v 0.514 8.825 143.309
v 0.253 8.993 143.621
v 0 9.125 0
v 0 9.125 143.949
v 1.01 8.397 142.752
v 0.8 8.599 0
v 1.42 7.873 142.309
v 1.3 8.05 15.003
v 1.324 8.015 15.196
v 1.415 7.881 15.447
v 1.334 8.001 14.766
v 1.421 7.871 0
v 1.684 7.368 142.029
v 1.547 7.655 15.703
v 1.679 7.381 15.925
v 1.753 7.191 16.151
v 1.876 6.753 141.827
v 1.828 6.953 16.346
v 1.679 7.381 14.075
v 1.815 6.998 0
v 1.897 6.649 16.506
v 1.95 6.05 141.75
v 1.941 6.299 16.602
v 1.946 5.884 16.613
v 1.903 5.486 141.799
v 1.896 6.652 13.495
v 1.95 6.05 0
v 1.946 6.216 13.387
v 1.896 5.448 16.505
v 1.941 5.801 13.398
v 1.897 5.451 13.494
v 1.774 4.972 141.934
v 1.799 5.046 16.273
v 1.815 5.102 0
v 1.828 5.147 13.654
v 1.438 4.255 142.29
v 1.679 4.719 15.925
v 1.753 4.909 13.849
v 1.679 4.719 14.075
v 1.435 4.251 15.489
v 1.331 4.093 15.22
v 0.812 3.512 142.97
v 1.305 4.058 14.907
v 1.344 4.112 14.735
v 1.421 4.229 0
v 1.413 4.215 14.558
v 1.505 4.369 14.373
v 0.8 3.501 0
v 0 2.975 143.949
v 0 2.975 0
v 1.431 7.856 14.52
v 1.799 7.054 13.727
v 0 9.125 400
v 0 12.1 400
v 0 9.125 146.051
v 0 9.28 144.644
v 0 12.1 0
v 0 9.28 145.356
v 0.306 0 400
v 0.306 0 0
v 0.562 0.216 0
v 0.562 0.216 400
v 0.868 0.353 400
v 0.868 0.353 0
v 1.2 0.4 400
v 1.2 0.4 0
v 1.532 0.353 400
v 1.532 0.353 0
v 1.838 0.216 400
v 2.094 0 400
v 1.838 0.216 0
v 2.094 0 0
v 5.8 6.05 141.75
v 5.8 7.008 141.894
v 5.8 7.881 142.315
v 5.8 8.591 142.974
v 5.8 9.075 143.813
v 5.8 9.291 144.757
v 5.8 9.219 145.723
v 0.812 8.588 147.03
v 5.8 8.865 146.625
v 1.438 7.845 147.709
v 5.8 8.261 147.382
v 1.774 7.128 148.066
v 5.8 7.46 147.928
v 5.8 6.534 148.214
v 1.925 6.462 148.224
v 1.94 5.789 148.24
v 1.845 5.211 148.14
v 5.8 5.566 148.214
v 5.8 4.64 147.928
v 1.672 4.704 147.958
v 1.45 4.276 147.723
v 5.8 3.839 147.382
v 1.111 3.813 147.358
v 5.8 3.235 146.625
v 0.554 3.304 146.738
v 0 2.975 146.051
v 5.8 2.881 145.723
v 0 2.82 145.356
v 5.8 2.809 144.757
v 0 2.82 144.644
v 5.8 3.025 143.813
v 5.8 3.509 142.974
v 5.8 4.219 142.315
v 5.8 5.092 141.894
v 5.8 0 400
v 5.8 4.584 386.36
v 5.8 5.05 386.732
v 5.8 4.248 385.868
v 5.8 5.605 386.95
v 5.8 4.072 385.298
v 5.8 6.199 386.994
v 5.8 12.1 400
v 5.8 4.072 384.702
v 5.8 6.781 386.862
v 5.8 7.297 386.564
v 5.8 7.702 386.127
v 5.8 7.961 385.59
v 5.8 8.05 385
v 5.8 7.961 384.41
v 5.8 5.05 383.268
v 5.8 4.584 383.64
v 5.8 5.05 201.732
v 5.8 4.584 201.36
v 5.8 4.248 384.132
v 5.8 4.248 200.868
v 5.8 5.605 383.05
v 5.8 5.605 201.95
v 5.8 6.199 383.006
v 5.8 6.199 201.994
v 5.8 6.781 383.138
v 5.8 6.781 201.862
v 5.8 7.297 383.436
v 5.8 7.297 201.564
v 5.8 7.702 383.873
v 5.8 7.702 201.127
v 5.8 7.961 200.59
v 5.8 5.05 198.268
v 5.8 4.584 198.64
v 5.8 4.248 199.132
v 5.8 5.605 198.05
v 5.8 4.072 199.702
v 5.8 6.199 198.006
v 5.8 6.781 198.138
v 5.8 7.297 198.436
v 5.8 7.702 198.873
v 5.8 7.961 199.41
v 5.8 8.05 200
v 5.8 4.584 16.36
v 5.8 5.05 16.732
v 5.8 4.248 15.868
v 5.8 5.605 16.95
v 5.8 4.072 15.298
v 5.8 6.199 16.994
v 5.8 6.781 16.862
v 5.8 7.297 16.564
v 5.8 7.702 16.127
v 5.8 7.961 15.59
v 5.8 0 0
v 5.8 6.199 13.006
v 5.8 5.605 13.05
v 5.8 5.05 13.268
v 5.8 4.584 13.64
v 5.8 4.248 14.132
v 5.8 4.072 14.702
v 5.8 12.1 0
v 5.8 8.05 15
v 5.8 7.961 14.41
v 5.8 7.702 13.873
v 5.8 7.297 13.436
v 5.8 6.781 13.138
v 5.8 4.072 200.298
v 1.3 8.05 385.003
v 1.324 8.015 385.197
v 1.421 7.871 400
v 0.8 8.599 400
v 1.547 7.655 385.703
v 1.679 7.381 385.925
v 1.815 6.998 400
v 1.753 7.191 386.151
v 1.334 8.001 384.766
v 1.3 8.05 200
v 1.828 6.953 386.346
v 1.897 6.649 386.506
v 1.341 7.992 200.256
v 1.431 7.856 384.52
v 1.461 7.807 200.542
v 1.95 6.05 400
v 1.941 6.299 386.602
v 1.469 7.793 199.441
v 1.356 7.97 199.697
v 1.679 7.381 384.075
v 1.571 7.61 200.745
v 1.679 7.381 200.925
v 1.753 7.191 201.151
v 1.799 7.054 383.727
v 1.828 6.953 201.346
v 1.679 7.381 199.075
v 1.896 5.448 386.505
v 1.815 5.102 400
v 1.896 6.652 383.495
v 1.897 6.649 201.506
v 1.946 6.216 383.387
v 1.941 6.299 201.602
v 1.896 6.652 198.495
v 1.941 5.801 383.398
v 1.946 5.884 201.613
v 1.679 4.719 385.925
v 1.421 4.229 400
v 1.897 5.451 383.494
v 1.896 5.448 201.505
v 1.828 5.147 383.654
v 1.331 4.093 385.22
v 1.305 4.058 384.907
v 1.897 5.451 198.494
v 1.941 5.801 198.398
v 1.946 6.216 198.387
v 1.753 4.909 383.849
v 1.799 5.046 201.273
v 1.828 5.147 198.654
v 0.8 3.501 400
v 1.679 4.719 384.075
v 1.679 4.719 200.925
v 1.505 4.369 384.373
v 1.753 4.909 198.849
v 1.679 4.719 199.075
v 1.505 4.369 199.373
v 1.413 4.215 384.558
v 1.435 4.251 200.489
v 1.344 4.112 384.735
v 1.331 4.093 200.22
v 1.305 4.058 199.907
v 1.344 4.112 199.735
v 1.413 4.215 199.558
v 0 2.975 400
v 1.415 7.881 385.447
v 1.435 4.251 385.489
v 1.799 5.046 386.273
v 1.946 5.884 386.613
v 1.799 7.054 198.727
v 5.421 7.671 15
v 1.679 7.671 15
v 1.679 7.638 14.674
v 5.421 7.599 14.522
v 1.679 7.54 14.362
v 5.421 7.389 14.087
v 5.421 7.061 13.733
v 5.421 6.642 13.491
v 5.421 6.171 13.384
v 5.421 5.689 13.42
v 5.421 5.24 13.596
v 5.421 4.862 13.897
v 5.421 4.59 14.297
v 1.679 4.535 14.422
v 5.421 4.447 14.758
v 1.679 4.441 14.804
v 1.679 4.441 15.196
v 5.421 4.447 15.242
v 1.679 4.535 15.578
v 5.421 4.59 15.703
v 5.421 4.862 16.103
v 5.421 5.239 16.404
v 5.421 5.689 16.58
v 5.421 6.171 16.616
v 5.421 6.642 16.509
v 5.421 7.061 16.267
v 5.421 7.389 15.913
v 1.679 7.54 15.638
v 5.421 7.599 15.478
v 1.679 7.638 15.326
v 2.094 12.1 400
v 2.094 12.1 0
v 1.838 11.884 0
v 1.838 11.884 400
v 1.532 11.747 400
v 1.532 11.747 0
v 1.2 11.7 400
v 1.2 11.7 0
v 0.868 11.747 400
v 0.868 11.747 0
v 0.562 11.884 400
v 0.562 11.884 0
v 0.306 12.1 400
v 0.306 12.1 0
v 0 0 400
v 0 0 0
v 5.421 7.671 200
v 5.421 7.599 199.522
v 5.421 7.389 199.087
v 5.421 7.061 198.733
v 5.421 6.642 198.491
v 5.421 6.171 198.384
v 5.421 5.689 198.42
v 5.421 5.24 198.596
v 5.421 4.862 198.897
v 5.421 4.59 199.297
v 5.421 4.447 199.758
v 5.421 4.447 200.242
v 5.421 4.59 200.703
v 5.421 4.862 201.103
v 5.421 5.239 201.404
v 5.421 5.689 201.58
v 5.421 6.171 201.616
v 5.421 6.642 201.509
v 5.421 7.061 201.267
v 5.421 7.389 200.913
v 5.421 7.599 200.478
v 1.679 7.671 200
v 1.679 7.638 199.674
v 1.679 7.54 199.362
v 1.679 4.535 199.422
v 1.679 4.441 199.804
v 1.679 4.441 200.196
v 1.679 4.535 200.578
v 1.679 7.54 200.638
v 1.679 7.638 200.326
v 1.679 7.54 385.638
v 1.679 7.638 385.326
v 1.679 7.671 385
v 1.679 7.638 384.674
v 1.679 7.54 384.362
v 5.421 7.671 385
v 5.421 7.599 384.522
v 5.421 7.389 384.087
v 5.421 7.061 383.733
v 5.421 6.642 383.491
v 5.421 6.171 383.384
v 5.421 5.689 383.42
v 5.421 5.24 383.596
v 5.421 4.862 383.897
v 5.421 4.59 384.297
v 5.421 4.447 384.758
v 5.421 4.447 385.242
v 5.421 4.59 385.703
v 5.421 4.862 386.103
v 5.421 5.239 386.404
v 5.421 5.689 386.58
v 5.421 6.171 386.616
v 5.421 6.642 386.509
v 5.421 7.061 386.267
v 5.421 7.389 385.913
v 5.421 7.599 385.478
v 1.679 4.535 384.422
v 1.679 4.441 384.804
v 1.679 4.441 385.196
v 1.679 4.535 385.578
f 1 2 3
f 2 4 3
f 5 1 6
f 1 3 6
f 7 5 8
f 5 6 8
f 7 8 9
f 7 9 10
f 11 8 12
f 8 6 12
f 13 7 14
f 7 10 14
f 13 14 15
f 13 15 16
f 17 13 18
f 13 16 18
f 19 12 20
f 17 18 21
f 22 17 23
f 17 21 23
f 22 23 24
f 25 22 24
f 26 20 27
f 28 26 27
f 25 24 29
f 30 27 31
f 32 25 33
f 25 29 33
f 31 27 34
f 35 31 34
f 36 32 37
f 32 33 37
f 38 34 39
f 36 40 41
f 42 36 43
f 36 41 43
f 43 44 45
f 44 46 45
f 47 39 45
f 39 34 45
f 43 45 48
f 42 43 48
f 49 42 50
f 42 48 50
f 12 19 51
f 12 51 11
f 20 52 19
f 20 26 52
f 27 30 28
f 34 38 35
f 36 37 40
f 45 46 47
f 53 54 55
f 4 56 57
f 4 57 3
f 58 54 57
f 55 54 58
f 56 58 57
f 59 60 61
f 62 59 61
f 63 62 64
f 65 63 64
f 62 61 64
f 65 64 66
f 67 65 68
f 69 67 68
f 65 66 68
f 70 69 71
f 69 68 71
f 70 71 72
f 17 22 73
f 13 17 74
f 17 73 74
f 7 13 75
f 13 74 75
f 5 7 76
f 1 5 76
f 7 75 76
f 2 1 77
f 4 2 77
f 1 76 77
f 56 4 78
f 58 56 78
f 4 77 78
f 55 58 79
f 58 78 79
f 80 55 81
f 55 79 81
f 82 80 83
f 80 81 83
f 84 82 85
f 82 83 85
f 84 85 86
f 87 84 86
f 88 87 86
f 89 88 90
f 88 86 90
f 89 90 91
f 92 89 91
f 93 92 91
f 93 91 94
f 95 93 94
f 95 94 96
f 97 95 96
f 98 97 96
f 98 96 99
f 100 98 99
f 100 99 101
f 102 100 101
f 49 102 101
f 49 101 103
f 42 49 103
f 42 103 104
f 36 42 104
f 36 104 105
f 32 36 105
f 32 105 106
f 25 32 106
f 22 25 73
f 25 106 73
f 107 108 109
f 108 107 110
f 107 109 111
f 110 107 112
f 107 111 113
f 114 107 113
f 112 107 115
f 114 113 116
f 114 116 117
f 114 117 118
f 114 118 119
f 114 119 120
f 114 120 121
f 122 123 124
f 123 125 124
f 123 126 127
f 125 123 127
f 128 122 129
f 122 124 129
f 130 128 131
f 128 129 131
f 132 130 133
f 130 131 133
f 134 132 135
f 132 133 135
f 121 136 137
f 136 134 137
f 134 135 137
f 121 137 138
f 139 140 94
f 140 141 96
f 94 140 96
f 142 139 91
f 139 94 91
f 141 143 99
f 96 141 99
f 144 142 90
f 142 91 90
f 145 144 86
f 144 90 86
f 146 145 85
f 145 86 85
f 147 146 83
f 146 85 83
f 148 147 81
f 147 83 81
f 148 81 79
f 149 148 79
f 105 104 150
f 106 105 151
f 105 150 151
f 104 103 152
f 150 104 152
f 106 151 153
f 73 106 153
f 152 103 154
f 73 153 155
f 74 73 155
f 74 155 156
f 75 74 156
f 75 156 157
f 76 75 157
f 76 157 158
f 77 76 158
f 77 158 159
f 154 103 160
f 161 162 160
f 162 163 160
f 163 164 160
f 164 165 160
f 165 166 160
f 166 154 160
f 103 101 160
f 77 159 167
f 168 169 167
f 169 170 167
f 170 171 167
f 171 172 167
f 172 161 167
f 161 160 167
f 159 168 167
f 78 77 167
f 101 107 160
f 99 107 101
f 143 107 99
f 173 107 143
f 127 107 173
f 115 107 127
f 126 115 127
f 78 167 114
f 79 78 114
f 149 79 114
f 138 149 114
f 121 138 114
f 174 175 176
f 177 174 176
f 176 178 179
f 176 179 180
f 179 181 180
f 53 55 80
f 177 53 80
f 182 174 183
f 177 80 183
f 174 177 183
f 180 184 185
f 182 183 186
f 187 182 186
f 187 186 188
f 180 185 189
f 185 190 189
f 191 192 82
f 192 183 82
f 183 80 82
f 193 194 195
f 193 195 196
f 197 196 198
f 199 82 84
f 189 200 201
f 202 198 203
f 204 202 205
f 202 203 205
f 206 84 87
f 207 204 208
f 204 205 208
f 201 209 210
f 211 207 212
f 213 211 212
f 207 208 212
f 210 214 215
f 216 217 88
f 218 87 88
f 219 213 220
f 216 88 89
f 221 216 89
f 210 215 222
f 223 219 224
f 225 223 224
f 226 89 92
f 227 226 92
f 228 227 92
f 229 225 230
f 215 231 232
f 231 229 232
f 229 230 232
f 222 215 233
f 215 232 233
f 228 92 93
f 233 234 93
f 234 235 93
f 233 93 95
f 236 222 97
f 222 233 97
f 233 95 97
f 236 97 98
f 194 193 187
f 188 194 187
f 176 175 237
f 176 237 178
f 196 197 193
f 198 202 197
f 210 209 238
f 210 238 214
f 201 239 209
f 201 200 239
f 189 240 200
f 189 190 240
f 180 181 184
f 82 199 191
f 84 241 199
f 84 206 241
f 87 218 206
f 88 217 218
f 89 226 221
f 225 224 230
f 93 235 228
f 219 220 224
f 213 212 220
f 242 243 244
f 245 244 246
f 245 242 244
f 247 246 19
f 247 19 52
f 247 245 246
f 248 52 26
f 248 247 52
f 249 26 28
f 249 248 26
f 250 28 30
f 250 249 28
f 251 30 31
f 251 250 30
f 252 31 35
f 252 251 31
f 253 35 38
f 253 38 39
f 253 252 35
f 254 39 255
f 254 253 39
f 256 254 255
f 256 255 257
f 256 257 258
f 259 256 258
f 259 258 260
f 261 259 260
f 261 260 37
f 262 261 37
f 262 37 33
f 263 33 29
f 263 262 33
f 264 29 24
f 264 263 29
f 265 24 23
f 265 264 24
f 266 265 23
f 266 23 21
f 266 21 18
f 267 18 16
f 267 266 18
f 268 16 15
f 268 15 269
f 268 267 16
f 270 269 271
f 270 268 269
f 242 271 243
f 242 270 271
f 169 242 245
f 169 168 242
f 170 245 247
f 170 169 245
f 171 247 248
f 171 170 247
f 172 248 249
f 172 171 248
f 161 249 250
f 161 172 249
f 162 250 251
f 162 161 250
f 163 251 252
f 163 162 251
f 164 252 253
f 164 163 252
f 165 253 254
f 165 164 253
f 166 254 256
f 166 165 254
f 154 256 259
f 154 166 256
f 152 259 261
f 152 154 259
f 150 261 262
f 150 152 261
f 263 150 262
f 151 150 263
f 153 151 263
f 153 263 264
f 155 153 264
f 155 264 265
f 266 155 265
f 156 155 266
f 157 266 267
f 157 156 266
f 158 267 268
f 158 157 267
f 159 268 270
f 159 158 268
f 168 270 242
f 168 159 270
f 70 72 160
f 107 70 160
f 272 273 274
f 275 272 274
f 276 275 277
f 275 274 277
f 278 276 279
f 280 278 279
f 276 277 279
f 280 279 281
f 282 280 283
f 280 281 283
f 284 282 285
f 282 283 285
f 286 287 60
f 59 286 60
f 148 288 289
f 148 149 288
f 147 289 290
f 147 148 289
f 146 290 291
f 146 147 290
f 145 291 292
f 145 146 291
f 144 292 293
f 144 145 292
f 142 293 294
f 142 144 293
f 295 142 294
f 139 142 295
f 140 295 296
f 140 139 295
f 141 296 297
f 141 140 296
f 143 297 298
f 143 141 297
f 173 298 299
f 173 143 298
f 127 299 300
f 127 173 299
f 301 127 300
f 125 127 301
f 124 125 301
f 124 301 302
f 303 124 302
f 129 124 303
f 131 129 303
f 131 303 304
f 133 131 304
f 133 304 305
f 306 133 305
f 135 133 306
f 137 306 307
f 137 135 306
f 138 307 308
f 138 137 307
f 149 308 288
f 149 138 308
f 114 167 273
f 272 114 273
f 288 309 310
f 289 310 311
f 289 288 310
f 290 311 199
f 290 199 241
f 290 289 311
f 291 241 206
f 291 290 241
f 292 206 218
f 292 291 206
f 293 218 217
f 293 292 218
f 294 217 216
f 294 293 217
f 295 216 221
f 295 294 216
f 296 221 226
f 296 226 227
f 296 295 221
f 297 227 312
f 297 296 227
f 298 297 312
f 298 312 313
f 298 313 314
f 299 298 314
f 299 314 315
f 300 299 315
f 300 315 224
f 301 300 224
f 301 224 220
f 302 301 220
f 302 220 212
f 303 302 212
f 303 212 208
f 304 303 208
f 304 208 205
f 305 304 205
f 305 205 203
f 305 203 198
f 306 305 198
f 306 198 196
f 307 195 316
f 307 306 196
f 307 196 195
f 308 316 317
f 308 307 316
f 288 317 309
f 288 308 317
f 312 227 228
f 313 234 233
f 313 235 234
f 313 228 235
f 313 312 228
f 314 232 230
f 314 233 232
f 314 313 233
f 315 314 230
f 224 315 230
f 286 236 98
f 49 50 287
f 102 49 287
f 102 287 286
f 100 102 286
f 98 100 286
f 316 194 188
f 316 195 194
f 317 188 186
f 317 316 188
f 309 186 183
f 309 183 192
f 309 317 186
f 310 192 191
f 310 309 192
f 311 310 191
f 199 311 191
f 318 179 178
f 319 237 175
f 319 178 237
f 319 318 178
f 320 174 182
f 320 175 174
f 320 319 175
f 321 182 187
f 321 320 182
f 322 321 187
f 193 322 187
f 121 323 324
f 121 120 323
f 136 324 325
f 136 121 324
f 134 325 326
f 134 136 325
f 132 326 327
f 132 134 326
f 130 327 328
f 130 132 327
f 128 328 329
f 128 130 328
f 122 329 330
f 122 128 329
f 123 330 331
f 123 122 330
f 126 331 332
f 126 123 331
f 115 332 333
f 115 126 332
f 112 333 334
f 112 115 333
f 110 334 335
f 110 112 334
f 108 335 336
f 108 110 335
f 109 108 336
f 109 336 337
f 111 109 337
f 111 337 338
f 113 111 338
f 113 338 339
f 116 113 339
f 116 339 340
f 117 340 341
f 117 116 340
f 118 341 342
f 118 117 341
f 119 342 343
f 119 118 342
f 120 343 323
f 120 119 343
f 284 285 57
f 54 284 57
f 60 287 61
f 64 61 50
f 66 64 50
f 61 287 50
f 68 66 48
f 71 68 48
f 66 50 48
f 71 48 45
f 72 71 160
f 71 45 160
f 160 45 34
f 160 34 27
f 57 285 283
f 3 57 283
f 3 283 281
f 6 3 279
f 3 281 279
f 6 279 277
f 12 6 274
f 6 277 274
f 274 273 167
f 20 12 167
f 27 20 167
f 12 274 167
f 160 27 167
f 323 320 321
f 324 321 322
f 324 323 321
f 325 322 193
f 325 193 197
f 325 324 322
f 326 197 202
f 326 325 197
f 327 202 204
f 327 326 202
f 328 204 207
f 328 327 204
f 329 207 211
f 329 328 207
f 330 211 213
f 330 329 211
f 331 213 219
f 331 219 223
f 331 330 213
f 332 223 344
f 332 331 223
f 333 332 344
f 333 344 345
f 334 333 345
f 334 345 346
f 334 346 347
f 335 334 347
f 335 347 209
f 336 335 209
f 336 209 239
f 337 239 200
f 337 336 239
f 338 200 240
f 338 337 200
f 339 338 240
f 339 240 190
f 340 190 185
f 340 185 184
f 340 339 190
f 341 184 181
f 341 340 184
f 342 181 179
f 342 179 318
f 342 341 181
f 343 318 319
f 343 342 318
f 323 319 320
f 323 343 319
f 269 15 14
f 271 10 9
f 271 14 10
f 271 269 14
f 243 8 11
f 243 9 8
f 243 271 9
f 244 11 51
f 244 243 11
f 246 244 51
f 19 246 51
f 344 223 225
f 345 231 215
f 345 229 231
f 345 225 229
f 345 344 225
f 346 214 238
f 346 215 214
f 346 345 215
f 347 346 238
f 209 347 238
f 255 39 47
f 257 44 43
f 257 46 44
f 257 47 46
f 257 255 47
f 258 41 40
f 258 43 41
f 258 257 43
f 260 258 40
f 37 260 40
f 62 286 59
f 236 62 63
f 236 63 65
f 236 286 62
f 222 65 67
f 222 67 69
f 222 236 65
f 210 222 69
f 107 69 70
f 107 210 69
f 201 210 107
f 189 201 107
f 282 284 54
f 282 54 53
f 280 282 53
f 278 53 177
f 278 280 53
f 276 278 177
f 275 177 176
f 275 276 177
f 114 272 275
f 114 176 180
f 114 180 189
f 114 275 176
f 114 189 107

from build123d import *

# Parameters (mm, degrees)
BOSS_EXTRUDE1_DEPTH = 400
SKETCH5_R           = 3.25
CUT_EXTRUDE1_DEPTH  = 6


with BuildPart() as part:
    # Sketch1 → Boss-Extrude1 (new body)
    with BuildSketch(Plane.XY):
        with BuildLine():
            Line((0, 2.974695), (0, 0))
            Line((0, 0), (0.305573, 0))
            ThreePointArc((0.305573, 0), (1.2, 0.4), (2.094427, 0))
            Line((2.094427, 0), (5.8, 0))
            Line((5.8, 0), (5.8, 12.1))
            Line((5.8, 12.1), (2.094427, 12.1))
            ThreePointArc((2.094427, 12.1), (1.2, 11.7), (0.305573, 12.1))
            Line((0.305573, 12.1), (0, 12.1))
            Line((0, 12.1), (0, 9.125305))
            ThreePointArc((0, 9.125305), (1.95, 6.05), (0, 2.974695))
        make_face()
    extrude(amount=BOSS_EXTRUDE1_DEPTH)

    # Sketch2 → Cut-Revolve1 (revolve, cut)
    with BuildSketch(Plane.XY.offset(15)):
        Polygon((1.299545, 6.05), (1.299545, 8.05), (1.678545, 7.671), (5.421, 7.671), (5.8, 8.05), (5.8, 6.05), align=None)
    revolve(axis=Axis((5.8, 6.05, 15), (-1, 0, 0)), mode=Mode.SUBTRACT)

    # Sketch3 → Cut-Revolve2 (revolve, cut)
    with BuildSketch(Plane.XY.offset(385)):
        Polygon((1.299545, 6.05), (1.299545, 8.05), (1.678545, 7.671), (5.421, 7.671), (5.8, 8.05), (5.8, 6.05), align=None)
    revolve(axis=Axis((5.8, 6.05, 385), (-1, 0, 0)), mode=Mode.SUBTRACT)

    # Sketch4 → Cut-Revolve3 (revolve, cut)
    with BuildSketch(Plane.XY.offset(200)):
        Polygon((1.299545, 6.05), (1.299545, 8.05), (1.678545, 7.671), (5.421, 7.671), (5.8, 8.05), (5.8, 6.05), align=None)
    revolve(axis=Axis((5.8, 6.05, 200), (-1, 0, 0)), mode=Mode.SUBTRACT)

    # Sketch5 → Cut-Extrude1 (cut)
    with BuildSketch(Plane(origin=(5.8, 0, 0), x_dir=(0, 0, -1), z_dir=(1, 0, 0))):
        with Locations((-145, 6.05)):
            Circle(SKETCH5_R)
    extrude(amount=-CUT_EXTRUDE1_DEPTH, mode=Mode.SUBTRACT)


solid = part.part
